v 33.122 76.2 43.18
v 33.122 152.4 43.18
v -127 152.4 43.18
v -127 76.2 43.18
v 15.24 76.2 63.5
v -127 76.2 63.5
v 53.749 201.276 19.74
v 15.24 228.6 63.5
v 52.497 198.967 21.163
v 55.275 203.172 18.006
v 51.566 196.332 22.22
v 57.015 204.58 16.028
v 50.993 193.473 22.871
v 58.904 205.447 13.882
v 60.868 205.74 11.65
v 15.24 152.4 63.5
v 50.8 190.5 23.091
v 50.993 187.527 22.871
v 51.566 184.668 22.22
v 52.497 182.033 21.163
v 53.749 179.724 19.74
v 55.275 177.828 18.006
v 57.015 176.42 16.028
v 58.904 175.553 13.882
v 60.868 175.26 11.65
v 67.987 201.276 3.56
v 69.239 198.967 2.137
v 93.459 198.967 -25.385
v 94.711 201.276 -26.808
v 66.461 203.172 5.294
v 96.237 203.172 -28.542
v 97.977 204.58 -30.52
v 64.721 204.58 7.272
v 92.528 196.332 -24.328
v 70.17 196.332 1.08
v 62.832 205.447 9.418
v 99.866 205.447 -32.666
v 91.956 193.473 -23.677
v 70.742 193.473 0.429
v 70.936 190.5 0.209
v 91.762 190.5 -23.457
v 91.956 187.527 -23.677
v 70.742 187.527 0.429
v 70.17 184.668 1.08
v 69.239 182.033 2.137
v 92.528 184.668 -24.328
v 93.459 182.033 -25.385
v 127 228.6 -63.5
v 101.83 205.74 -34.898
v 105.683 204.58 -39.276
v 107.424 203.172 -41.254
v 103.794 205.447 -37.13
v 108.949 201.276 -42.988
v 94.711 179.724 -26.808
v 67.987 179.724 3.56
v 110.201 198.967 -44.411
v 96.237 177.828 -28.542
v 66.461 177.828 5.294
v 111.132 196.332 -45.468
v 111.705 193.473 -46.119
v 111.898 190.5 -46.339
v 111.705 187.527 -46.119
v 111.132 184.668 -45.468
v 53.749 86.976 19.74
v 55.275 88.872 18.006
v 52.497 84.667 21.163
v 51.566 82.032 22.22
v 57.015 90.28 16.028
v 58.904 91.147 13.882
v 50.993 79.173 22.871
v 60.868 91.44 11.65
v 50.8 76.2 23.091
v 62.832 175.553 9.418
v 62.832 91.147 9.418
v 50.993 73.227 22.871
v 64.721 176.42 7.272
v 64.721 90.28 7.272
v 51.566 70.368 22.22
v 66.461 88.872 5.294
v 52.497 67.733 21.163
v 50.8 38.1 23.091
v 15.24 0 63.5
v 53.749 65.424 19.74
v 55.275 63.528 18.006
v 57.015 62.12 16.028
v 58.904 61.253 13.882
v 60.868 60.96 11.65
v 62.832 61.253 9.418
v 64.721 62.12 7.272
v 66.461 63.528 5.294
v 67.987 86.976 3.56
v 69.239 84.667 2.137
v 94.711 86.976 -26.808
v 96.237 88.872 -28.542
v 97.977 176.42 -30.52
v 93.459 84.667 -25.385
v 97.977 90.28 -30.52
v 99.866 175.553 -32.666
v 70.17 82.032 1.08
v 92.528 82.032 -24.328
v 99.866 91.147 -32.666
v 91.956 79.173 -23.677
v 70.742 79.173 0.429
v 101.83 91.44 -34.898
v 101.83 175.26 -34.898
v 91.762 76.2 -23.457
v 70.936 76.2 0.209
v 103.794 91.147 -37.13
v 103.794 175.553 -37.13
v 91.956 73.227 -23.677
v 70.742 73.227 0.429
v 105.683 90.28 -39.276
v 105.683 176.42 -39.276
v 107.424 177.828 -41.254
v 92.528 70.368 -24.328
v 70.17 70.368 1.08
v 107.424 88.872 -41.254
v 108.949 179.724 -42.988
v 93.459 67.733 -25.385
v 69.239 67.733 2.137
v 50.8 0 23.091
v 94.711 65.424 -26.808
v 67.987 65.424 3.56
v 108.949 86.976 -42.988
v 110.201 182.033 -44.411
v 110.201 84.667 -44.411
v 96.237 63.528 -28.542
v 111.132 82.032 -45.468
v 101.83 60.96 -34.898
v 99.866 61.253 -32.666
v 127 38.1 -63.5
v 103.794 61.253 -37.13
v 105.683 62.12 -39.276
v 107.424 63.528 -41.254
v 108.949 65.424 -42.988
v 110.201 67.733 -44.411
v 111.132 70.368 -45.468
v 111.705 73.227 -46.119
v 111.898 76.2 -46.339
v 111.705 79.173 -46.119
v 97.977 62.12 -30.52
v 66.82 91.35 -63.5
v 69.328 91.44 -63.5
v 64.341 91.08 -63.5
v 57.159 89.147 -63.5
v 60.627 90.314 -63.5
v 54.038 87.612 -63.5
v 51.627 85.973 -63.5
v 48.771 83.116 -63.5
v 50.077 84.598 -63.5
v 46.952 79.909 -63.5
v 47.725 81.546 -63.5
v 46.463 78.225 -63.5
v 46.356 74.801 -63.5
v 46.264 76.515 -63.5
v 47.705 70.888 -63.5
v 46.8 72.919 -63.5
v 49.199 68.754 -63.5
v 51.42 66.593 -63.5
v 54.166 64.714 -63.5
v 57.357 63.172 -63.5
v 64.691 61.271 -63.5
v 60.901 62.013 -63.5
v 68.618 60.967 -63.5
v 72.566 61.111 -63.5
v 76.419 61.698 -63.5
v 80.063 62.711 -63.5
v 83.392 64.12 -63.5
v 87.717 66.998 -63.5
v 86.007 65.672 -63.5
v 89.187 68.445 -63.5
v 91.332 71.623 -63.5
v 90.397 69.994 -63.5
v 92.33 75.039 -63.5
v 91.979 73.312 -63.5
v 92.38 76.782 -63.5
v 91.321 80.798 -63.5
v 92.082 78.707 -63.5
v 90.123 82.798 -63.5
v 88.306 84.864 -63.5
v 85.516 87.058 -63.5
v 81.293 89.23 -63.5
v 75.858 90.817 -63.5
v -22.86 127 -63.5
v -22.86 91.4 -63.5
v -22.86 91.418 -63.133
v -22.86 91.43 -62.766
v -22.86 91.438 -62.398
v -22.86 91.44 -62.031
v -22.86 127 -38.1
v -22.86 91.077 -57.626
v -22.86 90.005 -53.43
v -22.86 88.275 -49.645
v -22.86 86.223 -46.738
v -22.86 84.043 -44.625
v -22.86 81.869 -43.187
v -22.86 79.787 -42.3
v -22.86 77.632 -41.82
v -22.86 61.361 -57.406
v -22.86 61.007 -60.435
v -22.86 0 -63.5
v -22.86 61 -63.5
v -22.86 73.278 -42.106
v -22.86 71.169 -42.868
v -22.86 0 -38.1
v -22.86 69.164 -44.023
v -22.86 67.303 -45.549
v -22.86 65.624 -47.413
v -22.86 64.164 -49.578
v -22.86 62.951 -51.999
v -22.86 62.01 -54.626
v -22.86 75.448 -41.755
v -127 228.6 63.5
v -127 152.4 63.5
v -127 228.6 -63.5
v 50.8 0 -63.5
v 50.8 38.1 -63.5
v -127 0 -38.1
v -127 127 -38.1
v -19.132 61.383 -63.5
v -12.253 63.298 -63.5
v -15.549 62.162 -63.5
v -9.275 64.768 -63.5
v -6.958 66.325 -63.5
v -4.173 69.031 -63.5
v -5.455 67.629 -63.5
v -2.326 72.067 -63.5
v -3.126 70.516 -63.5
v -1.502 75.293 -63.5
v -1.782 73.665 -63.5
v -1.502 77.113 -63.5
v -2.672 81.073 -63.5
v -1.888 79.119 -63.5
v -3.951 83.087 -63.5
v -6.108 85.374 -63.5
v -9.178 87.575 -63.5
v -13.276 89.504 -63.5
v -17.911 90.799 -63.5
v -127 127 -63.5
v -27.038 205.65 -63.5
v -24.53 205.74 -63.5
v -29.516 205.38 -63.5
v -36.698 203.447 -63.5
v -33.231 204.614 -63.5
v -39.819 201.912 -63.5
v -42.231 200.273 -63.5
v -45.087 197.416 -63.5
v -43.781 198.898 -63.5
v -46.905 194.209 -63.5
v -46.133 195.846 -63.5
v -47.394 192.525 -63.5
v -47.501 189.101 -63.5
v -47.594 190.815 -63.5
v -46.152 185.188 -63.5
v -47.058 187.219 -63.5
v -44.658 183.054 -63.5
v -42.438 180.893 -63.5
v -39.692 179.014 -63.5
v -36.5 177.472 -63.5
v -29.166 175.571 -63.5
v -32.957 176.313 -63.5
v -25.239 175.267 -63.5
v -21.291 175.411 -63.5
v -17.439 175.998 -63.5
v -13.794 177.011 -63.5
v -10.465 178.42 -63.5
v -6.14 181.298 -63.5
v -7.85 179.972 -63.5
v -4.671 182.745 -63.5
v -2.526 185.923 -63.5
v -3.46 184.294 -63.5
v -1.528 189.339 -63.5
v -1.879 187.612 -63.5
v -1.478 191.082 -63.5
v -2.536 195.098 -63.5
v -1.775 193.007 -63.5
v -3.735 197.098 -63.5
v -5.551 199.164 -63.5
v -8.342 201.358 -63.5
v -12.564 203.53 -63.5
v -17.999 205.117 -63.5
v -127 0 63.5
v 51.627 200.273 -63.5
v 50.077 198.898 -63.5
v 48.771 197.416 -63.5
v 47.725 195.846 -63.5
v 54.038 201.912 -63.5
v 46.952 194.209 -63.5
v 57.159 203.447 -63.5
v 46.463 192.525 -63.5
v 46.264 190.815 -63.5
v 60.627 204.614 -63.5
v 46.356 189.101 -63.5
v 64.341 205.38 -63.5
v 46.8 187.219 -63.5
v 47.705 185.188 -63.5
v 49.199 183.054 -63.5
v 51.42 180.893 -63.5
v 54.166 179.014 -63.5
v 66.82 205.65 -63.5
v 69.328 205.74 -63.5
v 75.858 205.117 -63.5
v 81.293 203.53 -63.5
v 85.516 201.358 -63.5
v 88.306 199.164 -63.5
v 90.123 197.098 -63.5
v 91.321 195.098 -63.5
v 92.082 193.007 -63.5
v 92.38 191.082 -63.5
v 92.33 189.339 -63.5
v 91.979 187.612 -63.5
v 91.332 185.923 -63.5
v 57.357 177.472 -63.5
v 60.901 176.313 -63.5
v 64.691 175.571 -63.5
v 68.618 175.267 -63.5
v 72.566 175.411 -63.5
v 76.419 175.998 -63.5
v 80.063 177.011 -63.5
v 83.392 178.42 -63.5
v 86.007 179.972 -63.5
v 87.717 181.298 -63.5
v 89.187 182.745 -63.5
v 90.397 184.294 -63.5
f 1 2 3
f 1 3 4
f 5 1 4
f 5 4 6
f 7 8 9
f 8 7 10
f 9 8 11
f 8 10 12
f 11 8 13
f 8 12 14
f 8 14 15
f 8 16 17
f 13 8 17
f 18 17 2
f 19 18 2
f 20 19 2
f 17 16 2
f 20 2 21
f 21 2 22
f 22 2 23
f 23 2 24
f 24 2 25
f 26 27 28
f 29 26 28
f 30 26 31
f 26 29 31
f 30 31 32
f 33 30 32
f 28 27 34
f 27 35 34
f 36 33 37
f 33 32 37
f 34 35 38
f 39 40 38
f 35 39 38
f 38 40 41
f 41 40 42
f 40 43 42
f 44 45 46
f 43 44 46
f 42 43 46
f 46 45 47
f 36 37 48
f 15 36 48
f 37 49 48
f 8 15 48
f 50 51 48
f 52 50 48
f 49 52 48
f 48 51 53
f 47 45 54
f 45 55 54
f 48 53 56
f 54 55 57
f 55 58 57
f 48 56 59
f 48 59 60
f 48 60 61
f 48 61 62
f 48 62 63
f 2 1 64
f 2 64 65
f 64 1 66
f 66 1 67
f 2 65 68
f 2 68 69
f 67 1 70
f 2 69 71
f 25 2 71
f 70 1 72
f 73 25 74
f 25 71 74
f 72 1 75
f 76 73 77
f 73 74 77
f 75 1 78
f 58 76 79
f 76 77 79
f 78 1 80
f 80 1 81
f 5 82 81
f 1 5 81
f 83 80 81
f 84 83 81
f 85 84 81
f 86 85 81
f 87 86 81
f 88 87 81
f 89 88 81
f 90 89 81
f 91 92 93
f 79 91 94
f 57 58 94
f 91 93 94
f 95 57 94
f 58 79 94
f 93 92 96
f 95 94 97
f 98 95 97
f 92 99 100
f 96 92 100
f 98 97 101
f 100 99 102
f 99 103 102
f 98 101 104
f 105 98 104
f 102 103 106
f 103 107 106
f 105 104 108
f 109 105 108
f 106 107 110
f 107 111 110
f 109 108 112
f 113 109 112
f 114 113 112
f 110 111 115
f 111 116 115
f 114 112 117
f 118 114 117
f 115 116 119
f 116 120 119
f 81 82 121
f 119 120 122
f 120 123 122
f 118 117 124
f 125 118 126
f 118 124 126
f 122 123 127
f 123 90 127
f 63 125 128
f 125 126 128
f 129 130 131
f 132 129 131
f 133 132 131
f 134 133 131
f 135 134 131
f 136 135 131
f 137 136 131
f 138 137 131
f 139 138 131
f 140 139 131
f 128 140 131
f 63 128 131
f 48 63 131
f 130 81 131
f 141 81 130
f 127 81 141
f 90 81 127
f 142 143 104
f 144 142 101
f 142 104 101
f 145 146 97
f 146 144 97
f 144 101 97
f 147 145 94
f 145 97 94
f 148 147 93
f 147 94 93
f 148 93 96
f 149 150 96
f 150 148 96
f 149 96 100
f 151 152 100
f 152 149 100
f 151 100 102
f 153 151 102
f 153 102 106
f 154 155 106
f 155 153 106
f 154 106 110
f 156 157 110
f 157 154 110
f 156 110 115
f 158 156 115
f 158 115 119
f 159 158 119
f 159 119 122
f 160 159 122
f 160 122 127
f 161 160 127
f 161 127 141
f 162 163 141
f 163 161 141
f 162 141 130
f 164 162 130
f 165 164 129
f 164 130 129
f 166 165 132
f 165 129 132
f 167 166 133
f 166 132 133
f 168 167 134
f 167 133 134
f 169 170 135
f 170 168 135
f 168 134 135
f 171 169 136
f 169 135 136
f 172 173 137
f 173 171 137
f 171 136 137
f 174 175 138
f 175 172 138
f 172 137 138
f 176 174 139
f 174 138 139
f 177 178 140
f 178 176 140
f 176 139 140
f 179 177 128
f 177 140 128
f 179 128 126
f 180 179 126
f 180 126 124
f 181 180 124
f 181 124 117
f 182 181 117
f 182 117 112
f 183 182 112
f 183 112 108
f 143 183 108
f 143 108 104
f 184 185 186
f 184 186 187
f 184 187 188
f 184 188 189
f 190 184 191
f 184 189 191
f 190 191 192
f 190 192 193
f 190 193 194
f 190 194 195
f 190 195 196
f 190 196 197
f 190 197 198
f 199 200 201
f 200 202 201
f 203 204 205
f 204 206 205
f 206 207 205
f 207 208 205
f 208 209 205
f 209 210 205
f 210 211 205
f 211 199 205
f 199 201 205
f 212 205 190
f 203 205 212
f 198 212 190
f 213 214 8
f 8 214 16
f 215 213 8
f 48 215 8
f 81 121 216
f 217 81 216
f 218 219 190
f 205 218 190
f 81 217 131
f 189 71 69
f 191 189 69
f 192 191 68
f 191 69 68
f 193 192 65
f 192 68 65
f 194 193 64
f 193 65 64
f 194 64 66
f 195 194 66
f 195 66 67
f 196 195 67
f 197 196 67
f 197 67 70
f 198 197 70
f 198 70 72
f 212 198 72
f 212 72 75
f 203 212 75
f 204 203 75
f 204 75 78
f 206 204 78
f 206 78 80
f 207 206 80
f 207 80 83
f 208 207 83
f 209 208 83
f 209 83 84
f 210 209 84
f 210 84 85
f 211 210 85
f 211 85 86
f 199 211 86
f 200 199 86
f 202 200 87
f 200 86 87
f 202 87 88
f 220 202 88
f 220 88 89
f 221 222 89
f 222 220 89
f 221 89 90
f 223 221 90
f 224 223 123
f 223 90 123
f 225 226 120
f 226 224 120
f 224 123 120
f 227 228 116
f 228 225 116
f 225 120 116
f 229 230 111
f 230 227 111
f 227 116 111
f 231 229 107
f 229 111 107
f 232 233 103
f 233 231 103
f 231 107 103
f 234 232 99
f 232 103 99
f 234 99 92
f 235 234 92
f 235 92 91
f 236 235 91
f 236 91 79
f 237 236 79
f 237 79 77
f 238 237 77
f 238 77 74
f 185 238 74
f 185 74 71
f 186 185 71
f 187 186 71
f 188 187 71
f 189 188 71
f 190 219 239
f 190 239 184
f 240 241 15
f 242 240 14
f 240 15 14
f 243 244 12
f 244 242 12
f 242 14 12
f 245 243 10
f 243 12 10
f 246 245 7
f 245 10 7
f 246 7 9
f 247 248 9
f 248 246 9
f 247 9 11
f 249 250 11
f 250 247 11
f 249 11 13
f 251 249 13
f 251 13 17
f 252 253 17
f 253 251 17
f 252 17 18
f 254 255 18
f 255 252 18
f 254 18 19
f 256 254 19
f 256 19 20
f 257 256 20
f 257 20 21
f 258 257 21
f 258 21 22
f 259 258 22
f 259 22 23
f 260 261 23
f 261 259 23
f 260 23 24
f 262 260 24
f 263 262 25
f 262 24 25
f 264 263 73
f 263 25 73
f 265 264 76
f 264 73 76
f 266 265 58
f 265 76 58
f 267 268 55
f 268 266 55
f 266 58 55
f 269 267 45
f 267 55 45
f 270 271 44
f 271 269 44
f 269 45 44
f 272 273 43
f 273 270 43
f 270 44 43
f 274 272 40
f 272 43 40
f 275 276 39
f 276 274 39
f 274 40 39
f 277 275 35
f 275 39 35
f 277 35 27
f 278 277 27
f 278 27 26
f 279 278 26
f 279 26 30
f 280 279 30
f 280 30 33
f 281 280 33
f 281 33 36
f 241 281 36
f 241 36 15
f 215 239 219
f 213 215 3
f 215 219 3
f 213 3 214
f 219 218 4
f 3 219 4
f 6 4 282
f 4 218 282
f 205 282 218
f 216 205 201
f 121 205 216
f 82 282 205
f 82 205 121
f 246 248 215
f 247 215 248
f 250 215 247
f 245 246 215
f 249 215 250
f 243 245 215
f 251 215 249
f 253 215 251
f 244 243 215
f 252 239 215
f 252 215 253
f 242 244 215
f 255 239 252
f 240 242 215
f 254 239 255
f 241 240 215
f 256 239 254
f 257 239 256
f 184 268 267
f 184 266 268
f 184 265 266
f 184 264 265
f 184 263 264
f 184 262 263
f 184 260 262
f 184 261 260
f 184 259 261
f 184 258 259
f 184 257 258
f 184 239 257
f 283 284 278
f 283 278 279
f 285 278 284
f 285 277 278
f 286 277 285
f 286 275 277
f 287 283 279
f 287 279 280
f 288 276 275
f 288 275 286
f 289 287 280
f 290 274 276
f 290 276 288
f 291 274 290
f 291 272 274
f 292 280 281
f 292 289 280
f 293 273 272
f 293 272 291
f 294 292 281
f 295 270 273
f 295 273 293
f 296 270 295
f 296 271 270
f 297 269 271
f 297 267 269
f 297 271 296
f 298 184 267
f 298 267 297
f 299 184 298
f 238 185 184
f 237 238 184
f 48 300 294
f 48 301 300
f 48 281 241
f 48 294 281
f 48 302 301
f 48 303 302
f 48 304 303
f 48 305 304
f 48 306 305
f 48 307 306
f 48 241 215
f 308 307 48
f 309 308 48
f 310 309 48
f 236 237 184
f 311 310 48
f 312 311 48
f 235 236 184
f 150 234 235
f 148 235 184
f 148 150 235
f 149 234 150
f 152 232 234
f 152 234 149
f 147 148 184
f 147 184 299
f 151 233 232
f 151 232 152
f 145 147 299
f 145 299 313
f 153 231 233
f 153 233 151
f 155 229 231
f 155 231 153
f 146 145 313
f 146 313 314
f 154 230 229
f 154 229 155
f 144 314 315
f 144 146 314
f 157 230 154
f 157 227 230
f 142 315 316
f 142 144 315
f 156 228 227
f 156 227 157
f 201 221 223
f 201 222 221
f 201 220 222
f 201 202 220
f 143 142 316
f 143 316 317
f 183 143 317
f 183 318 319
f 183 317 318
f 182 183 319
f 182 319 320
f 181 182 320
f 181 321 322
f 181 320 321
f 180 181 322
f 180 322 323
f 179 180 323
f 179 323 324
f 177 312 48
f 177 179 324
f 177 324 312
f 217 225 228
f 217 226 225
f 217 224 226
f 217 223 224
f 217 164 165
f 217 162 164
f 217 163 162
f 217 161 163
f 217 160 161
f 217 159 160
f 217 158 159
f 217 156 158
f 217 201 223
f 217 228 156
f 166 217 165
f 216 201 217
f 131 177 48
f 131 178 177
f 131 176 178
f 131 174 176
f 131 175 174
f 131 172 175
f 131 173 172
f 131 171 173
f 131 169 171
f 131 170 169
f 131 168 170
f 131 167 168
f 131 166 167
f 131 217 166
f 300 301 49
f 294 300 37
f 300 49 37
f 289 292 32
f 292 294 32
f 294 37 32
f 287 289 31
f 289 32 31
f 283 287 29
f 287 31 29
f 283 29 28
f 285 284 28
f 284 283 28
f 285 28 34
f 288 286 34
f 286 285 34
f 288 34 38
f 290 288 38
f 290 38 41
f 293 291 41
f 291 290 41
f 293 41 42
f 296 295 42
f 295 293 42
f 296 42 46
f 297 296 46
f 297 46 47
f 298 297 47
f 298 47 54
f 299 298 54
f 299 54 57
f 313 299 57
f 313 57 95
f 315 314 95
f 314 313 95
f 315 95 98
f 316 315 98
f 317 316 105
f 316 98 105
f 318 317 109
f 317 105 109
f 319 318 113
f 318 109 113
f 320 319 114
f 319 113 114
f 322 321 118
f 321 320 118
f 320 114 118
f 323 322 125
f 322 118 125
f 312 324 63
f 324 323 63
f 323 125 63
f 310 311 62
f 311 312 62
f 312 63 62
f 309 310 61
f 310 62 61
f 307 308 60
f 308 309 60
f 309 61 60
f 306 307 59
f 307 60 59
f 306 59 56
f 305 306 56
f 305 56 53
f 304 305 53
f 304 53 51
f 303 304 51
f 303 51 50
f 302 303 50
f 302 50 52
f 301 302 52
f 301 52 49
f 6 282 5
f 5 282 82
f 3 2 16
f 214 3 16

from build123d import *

# Parameters (mm, degrees)
F0_W      = 254
F0_H      = 127
F1_DEPTH  = 228.6
F3_DEPTH  = 1270
F5_DEPTH  = 38.1
F6_W      = 104.14
F6_H      = 25.4
F7_DEPTH  = 127
F8_R      = 15.24
F9_DEPTH  = 1270
F10_W     = 76.2
F10_H     = 20.32
F11_DEPTH = 1270


with BuildPart() as f1:
    # F0 (on Front) → F1 (new body)
    with BuildSketch(Plane.XZ):
        Rectangle(F0_W, F0_H)
    extrude(amount=-F1_DEPTH)

    # F2 (on face) → F3 (cut)
    with BuildSketch(Plane.XZ):
        Polygon((127, 63.5), (15.24, 63.5), (127, -63.5), align=None)
    extrude(amount=-F3_DEPTH, mode=Mode.SUBTRACT)

    # F4 (on face) → F5 (cut)
    with BuildSketch(Plane.XZ):
        Polygon((50.8, -63.5), (127, -63.5), (50.8, 23.0909090909), align=None)
    extrude(amount=-F5_DEPTH, mode=Mode.SUBTRACT)

    # F6 (on face) → F7 (cut)
    with BuildSketch(Plane.XZ):
        with Locations((-74.93, -50.8)):
            Rectangle(F6_W, F6_H)
    extrude(amount=-F7_DEPTH, mode=Mode.SUBTRACT)

    # F8 (on face) → F9 (cut)
    with BuildSketch(Plane(origin=(40.081154193, 0, 35.2714156898), x_dir=(0, 1, 0), z_dir=(0.7507135169, 0, 0.6606278949))):
        with Locations((76.2, -31.4652394879)):
            Circle(F8_R)
        with Locations((190.5, -31.4652394879)):
            Circle(F8_R)
        with Locations((190.5, -93.4700509759)):
            Circle(F8_R)
        with Locations((76.2, -93.4700509759)):
            Circle(F8_R)
    extrude(amount=-F9_DEPTH, mode=Mode.SUBTRACT)

    # F10 (on face) → F11 (cut)
    with BuildSketch(Plane(origin=(-127, 0, 0), x_dir=(0, -1, 0), z_dir=(-1, 0, 0))):
        with Locations((-114.3, 53.34)):
            Rectangle(F10_W, F10_H)
    extrude(amount=-F11_DEPTH, mode=Mode.SUBTRACT)


solid = f1.part
